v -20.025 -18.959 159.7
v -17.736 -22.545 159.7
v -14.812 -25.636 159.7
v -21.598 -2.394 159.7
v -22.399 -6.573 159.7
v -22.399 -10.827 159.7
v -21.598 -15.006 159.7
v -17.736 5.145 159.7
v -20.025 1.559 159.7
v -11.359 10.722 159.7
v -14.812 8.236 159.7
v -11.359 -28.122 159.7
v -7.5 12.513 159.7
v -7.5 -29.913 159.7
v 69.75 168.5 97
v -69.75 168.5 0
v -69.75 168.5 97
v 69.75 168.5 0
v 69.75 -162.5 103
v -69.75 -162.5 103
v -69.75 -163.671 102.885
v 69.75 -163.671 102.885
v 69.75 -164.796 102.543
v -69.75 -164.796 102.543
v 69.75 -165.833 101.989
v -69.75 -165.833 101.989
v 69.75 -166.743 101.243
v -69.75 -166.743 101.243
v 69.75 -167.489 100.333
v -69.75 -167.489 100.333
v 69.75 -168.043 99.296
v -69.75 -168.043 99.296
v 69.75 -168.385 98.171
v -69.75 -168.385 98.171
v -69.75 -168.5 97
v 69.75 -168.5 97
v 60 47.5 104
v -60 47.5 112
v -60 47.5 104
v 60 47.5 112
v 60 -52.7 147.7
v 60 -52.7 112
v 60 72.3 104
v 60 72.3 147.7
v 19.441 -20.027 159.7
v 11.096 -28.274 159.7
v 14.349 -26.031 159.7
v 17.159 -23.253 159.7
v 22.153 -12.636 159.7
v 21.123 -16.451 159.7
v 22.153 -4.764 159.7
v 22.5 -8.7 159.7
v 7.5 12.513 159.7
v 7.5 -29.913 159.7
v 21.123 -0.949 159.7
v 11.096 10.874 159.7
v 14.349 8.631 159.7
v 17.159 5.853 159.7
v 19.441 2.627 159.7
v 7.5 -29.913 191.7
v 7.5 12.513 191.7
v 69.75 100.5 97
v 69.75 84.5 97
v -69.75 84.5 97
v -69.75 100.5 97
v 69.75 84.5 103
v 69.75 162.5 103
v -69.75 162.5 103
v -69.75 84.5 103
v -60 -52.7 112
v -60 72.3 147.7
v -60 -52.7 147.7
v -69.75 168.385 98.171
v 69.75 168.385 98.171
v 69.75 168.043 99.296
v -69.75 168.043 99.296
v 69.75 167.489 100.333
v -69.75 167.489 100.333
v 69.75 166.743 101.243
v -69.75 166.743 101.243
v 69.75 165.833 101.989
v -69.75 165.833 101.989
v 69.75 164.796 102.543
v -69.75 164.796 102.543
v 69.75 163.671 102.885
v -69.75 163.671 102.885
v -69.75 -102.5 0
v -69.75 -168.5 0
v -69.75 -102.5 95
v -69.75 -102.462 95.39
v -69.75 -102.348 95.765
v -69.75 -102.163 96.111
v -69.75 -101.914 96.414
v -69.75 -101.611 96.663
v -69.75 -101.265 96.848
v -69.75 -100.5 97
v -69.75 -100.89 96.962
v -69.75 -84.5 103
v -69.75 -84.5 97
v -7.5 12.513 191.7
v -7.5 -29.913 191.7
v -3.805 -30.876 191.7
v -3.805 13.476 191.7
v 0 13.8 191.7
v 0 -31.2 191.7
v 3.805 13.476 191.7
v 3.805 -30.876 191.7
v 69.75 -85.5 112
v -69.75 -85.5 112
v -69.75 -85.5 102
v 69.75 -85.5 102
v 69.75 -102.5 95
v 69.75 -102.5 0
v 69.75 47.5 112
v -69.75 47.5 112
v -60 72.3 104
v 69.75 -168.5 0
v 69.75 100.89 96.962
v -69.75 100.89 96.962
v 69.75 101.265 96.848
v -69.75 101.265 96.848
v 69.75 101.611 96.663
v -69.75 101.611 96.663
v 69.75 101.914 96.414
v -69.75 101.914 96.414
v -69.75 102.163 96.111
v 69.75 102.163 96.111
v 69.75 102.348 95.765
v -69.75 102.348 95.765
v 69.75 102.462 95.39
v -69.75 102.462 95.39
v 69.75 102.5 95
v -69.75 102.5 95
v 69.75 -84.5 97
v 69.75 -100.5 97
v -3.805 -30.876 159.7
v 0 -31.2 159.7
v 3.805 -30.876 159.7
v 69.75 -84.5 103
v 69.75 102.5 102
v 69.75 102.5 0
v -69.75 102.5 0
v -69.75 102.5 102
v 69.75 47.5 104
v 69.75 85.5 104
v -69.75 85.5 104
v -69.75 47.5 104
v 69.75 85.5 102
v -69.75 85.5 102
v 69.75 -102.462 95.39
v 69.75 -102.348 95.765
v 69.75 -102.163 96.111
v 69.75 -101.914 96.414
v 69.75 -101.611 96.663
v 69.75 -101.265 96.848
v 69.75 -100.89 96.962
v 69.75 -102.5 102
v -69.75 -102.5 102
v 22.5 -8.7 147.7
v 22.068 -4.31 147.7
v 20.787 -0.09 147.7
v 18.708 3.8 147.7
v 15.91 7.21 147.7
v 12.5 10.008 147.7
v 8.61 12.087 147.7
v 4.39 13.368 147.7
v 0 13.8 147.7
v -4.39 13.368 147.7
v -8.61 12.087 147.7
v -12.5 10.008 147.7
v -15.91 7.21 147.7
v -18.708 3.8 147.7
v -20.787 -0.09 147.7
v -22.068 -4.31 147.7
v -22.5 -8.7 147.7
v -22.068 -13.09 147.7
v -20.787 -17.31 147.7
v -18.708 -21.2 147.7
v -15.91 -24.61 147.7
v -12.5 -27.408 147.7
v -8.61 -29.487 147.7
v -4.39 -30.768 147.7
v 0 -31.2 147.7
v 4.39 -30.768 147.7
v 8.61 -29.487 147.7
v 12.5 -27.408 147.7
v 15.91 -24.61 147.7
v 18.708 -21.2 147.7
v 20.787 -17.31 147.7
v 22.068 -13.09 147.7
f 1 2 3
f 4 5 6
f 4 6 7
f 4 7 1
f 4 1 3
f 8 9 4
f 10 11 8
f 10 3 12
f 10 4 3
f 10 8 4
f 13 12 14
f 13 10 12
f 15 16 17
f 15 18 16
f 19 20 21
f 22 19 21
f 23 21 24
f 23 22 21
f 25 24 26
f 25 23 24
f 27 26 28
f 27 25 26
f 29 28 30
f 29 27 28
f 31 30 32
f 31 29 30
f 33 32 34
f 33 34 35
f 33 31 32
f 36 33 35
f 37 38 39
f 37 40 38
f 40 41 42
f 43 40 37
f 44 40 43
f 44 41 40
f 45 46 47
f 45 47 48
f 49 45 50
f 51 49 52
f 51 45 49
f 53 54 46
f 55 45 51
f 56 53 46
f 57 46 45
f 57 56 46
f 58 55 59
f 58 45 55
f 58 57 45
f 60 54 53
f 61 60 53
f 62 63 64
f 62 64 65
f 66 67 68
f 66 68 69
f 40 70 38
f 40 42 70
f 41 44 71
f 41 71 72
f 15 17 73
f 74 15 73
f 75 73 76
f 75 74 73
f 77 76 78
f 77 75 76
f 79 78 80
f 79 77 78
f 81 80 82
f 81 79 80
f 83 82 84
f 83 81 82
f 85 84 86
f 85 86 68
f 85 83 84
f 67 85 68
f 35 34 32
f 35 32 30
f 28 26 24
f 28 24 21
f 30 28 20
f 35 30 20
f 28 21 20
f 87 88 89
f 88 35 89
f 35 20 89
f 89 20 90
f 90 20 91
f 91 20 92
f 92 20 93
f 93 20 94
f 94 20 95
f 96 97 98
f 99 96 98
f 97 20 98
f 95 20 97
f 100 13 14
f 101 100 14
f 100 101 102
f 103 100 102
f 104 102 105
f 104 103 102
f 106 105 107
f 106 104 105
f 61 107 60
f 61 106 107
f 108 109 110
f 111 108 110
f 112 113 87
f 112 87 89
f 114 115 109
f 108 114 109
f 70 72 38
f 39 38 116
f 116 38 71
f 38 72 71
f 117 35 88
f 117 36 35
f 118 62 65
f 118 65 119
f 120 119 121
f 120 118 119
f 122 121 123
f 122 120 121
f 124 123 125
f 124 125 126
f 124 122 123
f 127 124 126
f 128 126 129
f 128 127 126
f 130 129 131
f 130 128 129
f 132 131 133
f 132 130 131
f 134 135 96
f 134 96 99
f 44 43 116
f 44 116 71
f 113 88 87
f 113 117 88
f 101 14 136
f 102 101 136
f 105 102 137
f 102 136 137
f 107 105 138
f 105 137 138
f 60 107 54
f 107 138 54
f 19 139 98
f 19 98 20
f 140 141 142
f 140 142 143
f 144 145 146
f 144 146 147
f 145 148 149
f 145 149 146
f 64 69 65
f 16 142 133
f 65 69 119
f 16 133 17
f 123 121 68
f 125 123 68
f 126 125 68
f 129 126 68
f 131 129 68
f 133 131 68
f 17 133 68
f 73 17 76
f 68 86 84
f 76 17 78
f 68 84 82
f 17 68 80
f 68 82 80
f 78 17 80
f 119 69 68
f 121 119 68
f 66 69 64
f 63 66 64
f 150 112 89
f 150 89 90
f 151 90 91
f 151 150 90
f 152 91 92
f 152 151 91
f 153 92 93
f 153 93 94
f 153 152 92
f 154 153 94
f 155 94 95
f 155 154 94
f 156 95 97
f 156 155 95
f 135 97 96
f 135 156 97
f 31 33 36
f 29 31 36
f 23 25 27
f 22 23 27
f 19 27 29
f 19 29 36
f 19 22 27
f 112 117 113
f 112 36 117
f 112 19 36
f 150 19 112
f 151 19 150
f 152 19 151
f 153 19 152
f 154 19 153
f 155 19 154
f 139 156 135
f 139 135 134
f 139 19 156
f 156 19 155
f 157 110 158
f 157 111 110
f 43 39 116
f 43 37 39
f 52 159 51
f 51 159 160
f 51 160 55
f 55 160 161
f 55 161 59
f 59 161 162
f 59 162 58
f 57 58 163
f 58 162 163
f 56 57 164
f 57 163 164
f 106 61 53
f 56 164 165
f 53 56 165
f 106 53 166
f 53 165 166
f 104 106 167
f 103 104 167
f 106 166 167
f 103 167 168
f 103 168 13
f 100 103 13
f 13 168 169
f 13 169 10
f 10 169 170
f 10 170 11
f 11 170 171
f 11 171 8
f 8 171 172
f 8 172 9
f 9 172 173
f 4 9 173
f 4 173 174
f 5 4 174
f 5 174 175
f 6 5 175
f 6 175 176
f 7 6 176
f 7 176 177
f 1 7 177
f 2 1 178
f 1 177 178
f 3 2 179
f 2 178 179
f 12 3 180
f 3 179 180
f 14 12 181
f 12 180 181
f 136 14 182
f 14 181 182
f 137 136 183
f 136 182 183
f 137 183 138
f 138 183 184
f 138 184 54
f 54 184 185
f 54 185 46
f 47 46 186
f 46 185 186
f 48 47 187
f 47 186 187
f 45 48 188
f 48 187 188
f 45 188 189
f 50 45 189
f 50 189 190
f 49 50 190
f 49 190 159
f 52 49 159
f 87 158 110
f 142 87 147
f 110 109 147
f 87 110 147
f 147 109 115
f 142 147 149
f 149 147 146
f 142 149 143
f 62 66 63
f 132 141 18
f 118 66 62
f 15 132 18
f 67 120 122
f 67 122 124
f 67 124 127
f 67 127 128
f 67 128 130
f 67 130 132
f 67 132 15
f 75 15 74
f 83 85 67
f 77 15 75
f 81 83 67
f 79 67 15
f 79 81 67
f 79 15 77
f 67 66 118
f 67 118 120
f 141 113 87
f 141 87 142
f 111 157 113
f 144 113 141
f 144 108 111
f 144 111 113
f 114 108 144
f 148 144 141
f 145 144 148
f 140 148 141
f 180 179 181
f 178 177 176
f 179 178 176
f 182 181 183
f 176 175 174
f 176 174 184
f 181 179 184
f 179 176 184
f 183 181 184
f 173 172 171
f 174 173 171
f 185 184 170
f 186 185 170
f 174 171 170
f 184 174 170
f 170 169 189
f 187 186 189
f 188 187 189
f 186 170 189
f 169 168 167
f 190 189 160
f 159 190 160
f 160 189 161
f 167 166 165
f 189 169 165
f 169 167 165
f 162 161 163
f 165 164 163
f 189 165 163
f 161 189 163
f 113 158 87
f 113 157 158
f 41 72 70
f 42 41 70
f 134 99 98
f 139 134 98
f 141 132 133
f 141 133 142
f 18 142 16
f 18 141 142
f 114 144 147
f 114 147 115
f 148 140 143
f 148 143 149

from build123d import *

# Parameters (mm, degrees)
F1_DEPTH  = 69.75
F3_DEPTH  = 60
F4_R      = 22.5
F5_DEPTH  = 12
F7_DEPTH  = 32
F10_DEPTH = 69.75


with BuildPart() as f1:
    # F0 (on Right) → F1 (new body, symmetric)
    with BuildSketch(Plane.YZ):
        Polygon((-102.5, 102), (-102.5, 0), (102.5, 0), (102.5, 102), (85.5, 102), (85.5, 104), (47.5, 104), (47.5, 112), (-85.5, 112), (-85.5, 102), align=None)
    extrude(amount=F1_DEPTH, both=True)


with BuildPart() as f3:
    # F2 (on Right) → F3 (new body, symmetric)
    with BuildSketch(Plane.YZ):
        Polygon((47.5, 104), (72.3, 104), (72.3, 147.7), (-52.7, 147.7), (-52.7, 112), (47.5, 112), align=None)
    extrude(amount=F3_DEPTH, both=True)


with BuildPart() as f5:
    # F4 (on face) → F5 (new body)
    with BuildSketch(Plane.XY.offset(147.7)):
        with Locations((0, -8.7)):
            Circle(F4_R)
    extrude(amount=F5_DEPTH)

    # F6 (on face) → F7 (join)
    with BuildSketch(Plane.XY.offset(159.7)):
        with BuildLine():
            Line((7.5, -29.9132034356), (7.5, 12.5132034356))
            ThreePointArc((7.5, 12.5132034356), (0, 13.8), (-7.5, 12.5132034356))
            Line((-7.5, 12.5132034356), (-7.5, -29.9132034356))
            ThreePointArc((-7.5, -29.9132034356), (0, -31.2), (7.5, -29.9132034356))
        make_face()
    extrude(amount=F7_DEPTH)


with BuildPart() as f10:
    # F9 (on Right) → F10 (new body, symmetric)
    with BuildSketch(Plane.YZ):
        with BuildLine():
            Line((-168.5, 0), (-102.5, 0))
            Line((-102.5, 0), (-102.5, 95))
            ThreePointArc((-102.5, 95), (-101.9142135624, 96.4142135624), (-100.5, 97))
            Line((-100.5, 97), (-84.5, 97))
            Line((-84.5, 97), (-84.5, 103))
            Line((-84.5, 103), (-162.5, 103))
            ThreePointArc((-162.5, 103), (-166.7426406871, 101.2426406871), (-168.5, 97))
            Line((-168.5, 97), (-168.5, 0))
        make_face()
    extrude(amount=F10_DEPTH, both=True)


with BuildPart() as f10b:
    # F9 (on Right) → F10, piece 2 (new body, symmetric)
    with BuildSketch(Plane.YZ):
        with BuildLine():
            ThreePointArc((168.5, 97), (166.7426406871, 101.2426406871), (162.5, 103))
            Line((162.5, 103), (84.5, 103))
            Line((84.5, 103), (84.5, 97))
            Line((84.5, 97), (100.5, 97))
            ThreePointArc((100.5, 97), (101.9142135624, 96.4142135624), (102.5, 95))
            Line((102.5, 95), (102.5, 0))
            Line((102.5, 0), (168.5, 0))
            Line((168.5, 0), (168.5, 97))
        make_face()
    extrude(amount=F10_DEPTH, both=True)


solid = Compound([f1.part, f3.part, f5.part, f10.part, f10b.part])
